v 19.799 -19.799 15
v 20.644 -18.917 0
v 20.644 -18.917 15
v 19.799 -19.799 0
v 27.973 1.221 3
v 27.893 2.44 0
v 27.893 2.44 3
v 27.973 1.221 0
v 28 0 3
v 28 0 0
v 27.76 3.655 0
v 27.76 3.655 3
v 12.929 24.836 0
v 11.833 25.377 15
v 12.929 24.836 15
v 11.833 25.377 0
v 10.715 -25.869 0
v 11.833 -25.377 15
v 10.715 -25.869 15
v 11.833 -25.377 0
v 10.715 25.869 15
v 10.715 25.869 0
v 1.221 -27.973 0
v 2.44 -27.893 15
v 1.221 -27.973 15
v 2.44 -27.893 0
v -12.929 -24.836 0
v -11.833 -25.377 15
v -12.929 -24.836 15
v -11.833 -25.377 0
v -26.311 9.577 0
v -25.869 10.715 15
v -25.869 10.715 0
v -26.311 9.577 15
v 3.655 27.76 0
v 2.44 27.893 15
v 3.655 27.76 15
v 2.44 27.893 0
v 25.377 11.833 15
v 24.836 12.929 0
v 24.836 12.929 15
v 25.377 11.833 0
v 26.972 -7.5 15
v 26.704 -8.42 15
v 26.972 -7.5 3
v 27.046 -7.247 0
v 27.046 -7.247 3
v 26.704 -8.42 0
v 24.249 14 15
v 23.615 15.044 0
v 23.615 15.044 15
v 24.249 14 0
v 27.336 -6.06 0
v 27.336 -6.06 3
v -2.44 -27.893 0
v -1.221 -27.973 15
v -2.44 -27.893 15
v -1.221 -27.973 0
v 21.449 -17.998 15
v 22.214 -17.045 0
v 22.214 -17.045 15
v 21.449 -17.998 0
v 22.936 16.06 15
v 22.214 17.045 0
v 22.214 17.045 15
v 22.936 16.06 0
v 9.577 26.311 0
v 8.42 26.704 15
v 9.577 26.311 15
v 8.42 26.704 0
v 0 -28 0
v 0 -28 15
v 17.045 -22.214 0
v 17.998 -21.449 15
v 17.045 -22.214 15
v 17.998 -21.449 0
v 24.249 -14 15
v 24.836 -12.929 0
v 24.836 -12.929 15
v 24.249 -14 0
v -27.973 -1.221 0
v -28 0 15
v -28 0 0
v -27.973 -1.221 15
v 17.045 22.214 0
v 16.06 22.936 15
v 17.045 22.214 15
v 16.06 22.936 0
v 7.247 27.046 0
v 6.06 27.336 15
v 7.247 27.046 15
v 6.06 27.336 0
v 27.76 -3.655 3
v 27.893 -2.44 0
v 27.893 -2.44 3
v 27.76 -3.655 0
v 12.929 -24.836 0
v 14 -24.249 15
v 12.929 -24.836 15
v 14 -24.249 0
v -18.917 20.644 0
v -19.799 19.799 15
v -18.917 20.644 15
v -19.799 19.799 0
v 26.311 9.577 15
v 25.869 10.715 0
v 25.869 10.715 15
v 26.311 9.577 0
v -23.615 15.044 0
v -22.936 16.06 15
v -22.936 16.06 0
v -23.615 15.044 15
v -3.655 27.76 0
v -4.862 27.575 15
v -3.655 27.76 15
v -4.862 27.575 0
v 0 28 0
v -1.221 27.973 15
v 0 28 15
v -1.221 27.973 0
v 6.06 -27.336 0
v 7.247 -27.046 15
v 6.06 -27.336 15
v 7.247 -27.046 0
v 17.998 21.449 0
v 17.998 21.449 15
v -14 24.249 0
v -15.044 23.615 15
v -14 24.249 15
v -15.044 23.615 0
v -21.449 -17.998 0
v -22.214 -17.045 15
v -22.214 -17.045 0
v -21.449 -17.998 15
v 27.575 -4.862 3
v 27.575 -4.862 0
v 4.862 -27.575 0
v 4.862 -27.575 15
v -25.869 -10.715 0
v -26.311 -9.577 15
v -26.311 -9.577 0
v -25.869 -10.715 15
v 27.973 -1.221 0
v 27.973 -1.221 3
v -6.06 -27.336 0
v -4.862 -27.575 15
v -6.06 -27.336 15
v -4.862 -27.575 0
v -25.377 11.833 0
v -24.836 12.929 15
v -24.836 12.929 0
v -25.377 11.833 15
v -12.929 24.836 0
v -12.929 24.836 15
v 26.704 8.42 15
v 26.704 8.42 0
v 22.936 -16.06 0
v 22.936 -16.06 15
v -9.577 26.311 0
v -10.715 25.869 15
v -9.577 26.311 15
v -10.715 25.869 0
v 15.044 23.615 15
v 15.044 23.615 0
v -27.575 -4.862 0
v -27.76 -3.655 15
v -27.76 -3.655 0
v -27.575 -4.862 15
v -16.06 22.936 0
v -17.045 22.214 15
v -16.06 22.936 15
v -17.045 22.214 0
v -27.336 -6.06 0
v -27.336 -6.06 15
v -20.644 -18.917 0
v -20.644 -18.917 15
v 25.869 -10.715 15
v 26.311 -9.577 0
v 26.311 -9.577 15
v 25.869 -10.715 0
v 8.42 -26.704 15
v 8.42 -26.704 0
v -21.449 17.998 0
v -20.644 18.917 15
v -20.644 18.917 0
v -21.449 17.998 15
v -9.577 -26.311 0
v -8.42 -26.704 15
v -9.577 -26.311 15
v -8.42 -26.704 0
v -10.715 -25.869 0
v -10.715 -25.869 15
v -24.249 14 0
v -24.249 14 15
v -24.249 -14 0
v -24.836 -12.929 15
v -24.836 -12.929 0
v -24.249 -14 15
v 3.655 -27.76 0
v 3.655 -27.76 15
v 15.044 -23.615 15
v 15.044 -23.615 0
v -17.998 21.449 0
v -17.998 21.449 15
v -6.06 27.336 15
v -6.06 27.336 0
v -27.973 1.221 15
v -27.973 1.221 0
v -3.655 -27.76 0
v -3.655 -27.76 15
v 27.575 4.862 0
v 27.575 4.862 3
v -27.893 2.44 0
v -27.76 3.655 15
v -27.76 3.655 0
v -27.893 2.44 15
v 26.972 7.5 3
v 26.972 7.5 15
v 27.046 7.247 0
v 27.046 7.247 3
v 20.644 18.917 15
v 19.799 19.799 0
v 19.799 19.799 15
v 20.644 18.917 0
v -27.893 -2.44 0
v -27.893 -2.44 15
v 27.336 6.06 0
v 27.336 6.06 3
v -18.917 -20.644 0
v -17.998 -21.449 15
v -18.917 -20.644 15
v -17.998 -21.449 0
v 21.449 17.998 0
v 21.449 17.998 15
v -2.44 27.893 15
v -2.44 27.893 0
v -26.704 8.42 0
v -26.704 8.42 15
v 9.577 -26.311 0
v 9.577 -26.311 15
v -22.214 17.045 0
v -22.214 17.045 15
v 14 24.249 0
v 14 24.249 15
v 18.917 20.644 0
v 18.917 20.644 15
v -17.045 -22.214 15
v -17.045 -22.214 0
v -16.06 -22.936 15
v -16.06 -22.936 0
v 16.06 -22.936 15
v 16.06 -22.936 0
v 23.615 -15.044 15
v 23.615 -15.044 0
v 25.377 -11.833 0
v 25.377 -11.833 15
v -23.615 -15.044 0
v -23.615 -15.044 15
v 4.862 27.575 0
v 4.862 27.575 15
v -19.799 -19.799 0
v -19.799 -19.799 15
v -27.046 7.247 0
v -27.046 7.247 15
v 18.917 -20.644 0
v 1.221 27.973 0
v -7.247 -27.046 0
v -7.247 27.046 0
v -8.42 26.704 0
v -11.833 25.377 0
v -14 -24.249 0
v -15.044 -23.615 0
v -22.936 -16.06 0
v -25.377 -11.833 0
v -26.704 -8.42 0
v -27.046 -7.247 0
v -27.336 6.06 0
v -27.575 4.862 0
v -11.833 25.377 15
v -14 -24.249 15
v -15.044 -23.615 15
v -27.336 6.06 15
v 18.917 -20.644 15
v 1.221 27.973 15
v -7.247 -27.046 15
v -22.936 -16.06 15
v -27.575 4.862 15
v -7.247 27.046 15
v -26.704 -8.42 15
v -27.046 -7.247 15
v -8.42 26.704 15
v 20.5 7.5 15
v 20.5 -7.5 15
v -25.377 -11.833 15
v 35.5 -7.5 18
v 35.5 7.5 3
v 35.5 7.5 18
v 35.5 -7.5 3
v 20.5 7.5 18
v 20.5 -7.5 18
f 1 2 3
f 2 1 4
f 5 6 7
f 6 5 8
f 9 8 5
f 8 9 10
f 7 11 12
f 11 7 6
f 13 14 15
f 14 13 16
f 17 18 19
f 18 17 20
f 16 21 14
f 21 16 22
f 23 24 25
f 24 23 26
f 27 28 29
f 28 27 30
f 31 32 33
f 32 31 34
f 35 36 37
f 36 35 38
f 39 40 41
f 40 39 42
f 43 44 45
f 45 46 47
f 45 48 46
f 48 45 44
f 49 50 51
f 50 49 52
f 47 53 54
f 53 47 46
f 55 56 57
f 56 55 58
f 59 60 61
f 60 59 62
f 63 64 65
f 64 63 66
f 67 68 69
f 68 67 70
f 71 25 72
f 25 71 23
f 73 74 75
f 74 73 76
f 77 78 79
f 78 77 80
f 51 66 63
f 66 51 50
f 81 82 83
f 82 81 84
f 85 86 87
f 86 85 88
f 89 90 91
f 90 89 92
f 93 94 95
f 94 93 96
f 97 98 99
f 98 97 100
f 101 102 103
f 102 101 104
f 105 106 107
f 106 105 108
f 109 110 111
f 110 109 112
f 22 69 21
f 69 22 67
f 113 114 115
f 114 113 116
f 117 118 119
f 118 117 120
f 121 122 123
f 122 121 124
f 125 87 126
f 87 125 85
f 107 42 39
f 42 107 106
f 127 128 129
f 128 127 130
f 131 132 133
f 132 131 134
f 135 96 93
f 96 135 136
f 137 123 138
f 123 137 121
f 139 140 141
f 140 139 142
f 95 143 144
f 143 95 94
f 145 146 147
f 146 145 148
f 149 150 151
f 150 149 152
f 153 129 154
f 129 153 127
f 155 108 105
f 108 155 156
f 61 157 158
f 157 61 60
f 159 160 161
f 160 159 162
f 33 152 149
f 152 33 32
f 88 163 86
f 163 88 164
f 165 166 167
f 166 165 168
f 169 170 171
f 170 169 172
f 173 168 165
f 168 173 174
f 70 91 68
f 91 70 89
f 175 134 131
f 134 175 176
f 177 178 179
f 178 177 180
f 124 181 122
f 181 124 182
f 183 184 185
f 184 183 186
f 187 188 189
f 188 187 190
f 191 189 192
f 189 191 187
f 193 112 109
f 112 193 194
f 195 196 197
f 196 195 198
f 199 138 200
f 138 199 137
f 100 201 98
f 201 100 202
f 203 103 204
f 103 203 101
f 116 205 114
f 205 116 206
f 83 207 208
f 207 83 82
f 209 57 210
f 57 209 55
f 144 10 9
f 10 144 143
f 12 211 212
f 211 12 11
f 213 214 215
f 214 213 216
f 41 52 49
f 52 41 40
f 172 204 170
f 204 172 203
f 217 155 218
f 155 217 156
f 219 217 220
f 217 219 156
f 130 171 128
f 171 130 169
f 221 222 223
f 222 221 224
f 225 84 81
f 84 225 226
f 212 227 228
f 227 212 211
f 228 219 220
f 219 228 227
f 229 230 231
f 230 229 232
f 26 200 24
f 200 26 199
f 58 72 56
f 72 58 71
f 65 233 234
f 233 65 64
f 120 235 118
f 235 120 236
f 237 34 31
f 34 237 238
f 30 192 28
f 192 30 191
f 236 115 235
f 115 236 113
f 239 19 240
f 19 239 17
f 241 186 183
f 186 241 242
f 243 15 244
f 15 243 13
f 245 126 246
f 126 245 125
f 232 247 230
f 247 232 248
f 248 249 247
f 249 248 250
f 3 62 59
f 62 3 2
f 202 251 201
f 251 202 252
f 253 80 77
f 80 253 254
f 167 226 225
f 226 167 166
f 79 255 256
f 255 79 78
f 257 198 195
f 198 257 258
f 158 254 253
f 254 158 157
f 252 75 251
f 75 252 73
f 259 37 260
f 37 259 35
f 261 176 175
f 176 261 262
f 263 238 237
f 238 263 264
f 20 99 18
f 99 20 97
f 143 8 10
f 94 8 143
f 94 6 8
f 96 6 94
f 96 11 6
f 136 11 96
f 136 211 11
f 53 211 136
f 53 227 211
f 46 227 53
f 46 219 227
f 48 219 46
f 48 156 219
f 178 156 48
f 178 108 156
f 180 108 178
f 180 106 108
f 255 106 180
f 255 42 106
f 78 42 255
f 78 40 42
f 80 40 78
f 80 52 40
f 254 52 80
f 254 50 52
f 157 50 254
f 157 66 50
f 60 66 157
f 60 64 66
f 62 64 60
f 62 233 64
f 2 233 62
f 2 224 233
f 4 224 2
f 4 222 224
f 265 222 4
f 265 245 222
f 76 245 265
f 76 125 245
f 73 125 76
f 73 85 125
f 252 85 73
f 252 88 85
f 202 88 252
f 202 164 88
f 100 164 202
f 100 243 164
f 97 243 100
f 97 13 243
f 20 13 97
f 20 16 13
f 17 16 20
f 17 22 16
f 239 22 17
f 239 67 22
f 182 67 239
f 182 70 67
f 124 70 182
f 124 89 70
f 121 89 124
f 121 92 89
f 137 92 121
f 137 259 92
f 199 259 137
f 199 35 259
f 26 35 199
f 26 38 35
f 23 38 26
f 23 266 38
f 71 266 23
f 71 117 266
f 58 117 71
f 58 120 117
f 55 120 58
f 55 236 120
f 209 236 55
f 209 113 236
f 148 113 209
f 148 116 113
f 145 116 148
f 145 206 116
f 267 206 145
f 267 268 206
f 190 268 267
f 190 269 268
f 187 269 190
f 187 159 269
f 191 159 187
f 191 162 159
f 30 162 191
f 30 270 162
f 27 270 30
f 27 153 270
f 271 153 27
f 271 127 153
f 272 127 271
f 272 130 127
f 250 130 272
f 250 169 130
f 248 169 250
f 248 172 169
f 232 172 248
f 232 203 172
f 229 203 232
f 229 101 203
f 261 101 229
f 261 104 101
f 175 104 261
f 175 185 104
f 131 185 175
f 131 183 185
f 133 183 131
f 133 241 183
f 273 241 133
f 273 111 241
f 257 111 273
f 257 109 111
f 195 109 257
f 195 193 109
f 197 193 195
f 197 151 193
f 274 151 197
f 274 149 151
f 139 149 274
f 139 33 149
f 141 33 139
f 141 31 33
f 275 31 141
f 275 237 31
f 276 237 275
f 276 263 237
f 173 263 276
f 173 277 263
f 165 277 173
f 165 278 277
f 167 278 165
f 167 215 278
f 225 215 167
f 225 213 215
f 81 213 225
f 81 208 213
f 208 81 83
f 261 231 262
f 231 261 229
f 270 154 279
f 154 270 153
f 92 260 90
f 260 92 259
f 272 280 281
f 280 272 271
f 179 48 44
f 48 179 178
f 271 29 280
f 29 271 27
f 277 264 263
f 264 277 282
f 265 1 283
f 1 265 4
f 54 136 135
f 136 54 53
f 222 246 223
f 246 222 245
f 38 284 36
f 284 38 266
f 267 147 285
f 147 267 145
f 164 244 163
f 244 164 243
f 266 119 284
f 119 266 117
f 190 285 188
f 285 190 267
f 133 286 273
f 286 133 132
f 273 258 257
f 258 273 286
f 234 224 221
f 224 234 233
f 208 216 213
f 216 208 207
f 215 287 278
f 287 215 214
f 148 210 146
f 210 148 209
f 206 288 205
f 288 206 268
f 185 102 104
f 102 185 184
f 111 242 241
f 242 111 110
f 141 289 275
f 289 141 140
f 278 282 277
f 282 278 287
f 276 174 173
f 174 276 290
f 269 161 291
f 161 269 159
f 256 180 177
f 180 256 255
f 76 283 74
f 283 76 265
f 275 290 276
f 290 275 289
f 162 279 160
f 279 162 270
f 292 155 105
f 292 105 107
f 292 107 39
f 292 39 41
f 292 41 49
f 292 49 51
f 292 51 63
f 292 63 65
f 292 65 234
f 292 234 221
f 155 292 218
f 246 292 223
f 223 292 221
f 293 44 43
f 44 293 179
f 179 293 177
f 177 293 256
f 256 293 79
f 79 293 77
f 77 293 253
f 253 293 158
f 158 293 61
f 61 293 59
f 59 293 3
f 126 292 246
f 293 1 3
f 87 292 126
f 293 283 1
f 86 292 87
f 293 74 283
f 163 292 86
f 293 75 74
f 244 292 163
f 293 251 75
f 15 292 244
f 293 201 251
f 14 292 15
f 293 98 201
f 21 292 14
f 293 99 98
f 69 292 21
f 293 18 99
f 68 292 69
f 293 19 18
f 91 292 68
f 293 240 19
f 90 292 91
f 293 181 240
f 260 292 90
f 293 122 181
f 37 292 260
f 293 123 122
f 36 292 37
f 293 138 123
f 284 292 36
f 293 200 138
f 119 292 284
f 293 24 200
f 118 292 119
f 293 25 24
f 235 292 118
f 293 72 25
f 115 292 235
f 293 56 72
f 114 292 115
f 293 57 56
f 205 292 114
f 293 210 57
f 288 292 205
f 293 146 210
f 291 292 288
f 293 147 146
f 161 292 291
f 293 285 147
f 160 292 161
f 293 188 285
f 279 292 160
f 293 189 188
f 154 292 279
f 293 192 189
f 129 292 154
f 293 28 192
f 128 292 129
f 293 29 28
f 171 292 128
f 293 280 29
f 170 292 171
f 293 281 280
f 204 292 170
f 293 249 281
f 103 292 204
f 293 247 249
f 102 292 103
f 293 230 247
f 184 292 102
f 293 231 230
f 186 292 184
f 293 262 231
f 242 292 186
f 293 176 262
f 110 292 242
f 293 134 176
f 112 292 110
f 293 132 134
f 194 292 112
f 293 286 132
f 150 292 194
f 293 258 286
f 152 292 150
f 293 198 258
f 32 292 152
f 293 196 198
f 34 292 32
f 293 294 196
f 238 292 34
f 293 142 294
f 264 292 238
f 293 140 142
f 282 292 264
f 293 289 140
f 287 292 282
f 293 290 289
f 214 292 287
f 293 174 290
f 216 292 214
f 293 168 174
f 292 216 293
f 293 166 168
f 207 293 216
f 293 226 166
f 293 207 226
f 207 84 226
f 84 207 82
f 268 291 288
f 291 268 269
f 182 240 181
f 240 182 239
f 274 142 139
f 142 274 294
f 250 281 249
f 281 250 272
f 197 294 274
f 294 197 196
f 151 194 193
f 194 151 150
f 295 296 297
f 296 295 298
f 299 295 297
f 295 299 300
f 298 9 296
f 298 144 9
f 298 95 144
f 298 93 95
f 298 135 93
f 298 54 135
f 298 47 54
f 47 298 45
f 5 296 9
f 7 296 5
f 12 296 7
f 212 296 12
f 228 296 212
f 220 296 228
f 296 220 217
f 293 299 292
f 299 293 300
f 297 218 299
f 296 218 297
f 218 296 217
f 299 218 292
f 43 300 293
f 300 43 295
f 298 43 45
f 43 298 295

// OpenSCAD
//Jabra Evolve 30 II

d=56;
h=15;

//Spalt für Stecker links und rechts
s=15;

//Kabeldicke
k=8;

t=3;

$fn=72*2;

cylinder(15, d/2, d/2);

translate([d/2-s/2,-s/2,t])
color("red")
cube([s,s,h]);

color("orange")
cylinder(15, d/2-t, d/2-t);

translate([0,0,t])
color("blue")
cylinder(k, d/2, d/2);
